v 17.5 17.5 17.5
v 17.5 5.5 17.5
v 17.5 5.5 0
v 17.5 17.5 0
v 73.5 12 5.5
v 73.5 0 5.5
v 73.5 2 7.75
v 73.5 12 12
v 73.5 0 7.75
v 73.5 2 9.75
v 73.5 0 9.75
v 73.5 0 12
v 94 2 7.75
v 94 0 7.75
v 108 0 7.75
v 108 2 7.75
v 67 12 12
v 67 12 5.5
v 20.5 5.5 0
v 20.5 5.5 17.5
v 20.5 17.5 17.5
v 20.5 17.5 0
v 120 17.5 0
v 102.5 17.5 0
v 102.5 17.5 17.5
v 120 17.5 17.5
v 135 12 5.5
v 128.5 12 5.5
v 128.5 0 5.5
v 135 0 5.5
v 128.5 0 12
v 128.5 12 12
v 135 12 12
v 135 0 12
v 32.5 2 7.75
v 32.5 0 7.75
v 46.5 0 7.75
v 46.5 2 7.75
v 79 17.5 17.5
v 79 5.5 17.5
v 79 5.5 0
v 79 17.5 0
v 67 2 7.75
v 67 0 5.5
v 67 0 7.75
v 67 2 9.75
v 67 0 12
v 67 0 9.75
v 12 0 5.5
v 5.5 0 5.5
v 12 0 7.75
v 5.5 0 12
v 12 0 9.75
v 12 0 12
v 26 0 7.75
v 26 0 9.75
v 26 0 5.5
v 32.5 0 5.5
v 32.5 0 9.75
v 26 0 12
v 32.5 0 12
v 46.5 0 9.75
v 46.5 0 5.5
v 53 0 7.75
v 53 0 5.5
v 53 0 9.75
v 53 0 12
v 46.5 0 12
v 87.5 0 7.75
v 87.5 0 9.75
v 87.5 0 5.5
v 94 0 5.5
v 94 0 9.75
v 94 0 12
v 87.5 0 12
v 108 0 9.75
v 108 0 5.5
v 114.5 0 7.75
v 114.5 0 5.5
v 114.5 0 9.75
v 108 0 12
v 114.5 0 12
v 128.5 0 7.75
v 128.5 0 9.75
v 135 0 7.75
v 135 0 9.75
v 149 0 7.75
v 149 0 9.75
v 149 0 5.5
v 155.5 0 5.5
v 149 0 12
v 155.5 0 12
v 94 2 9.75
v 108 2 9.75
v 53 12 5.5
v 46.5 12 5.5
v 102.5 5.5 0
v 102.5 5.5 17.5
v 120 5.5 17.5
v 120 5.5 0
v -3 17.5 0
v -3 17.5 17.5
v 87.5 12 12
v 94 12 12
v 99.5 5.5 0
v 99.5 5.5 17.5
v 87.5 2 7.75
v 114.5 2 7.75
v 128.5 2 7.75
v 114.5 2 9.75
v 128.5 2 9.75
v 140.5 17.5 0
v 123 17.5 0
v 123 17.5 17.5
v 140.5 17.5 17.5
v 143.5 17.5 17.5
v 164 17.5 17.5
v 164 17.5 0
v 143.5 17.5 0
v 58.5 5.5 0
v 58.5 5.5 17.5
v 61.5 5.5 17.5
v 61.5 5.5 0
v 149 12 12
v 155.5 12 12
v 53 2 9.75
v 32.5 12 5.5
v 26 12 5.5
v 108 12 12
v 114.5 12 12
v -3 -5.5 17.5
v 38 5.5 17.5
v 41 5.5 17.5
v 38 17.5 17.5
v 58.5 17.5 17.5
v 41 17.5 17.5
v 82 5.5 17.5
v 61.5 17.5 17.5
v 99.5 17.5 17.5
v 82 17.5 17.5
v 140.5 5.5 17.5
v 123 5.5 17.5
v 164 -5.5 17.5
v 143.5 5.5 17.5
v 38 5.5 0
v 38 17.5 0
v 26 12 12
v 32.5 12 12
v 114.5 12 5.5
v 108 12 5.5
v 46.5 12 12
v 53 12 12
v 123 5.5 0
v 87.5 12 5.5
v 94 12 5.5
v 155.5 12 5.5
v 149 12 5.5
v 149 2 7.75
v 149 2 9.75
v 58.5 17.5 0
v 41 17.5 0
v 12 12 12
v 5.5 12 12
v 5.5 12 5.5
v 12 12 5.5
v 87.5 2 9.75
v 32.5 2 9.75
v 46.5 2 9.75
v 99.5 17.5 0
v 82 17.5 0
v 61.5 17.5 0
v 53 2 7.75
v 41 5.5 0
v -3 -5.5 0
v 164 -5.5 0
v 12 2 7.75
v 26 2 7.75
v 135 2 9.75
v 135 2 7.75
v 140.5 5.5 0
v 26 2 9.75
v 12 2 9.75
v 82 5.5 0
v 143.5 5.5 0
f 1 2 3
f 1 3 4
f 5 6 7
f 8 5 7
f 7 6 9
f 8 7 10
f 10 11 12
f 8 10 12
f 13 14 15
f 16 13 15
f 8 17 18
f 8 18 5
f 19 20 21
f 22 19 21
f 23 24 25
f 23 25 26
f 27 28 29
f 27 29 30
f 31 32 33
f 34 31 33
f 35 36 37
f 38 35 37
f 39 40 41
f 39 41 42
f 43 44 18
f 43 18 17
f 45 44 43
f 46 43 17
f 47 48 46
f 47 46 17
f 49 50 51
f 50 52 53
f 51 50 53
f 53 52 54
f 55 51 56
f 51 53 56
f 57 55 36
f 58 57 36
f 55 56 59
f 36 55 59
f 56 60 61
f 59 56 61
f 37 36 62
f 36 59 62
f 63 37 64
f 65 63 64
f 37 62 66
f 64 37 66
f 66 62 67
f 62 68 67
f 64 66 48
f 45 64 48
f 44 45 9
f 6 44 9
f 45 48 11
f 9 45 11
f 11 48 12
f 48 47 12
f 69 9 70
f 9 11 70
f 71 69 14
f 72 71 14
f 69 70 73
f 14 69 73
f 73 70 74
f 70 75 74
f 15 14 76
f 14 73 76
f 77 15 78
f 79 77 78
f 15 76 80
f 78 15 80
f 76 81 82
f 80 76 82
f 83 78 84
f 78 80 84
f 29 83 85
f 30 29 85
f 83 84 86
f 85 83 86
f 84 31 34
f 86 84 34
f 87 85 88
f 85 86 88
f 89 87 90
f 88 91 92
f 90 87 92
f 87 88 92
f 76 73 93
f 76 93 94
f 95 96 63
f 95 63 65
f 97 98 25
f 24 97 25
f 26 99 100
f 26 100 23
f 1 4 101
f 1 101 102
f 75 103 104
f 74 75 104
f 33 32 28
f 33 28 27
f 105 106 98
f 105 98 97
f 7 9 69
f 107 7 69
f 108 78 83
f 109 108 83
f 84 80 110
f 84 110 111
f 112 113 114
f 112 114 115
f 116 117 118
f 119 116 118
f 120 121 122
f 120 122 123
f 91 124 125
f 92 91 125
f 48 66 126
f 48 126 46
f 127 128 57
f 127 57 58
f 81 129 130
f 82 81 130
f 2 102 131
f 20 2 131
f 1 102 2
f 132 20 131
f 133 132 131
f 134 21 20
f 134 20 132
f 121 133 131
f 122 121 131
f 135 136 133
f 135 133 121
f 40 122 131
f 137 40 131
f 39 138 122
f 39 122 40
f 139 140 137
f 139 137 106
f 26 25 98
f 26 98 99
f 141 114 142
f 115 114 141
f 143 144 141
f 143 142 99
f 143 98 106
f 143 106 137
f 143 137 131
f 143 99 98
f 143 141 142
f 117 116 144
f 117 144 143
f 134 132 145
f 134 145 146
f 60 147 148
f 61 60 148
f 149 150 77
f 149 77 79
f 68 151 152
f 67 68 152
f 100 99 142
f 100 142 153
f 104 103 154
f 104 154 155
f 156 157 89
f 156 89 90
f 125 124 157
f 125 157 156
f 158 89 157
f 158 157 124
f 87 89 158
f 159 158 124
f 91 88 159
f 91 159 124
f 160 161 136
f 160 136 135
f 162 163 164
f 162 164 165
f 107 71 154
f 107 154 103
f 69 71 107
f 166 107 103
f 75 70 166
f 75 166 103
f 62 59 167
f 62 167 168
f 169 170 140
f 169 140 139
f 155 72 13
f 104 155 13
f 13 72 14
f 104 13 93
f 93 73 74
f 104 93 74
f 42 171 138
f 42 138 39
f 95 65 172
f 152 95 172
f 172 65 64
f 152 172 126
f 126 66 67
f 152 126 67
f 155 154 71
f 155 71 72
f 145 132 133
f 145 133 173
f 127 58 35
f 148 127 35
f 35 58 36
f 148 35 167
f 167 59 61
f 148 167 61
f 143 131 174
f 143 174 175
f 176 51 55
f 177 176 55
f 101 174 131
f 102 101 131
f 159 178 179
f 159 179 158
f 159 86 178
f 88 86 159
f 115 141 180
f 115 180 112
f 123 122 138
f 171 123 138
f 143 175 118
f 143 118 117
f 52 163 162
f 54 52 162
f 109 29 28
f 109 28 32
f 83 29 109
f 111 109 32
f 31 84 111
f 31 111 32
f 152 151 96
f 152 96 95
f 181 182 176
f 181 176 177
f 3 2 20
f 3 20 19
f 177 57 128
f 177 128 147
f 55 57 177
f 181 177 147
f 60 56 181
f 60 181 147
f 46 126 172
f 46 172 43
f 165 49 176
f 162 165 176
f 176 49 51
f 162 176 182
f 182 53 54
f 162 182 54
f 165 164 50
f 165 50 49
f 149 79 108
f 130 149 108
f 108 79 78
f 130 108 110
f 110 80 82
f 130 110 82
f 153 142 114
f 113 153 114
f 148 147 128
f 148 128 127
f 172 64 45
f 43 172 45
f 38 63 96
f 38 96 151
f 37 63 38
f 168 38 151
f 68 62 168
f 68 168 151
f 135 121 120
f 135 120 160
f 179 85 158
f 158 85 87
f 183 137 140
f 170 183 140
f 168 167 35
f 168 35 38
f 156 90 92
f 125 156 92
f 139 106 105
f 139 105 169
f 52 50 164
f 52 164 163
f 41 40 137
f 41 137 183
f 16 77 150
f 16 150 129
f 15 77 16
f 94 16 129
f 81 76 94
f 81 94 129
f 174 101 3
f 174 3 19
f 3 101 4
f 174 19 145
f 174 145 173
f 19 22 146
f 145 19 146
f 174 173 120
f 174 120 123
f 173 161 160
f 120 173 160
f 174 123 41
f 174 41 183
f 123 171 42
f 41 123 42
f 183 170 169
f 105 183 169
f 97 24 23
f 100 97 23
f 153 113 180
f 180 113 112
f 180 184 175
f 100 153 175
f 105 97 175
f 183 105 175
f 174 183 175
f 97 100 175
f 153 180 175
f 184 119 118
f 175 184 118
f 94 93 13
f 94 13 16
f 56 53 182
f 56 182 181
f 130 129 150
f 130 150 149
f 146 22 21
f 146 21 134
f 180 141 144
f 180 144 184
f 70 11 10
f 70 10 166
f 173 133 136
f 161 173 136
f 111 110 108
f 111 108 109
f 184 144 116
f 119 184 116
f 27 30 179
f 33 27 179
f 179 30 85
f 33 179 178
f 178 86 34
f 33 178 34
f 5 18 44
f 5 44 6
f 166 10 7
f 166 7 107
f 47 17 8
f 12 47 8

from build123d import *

# Parameters (mm, degrees)
SKETCH1_W           = 17.5
SKETCH1_H           = 17.5
BOSS_EXTRUDE1_DEPTH = 17.5
SKETCH2_W           = 6.5
SKETCH2_H           = 6.5
CUT_EXTRUDE1_DEPTH  = 12
SKETCH3_W           = 17.5
SKETCH3_H           = 5.5
BOSS_EXTRUDE2_DEPTH = 3
LPATTERN1_COUNT     = 8
LPATTERN1_PITCH     = 20.5
SKETCH4_W           = 17.5
SKETCH4_H           = 12
BOSS_EXTRUDE3_DEPTH = 3
SKETCH5_W           = 17.5
SKETCH5_H           = 17.5
BOSS_EXTRUDE4_DEPTH = 3
SKETCH6_W           = 137
SKETCH6_H           = 2
CUT_EXTRUDE2_DEPTH  = 2
SKETCH7_W           = 167
SKETCH7_H           = 17.5
BOSS_EXTRUDE5_DEPTH = 5.5


with BuildPart() as part:
    # Sketch1 → Boss-Extrude1 (new body)
    with BuildSketch(Plane.XY):
        with Locations((8.75, 8.75)):
            Rectangle(SKETCH1_W, SKETCH1_H)
    extrude(amount=BOSS_EXTRUDE1_DEPTH)

    # Sketch2 → Cut-Extrude1 (cut)
    with BuildSketch(Plane.XZ):
        with Locations((8.75, 8.75)):
            Rectangle(SKETCH2_W, SKETCH2_H)
    extrude(amount=-CUT_EXTRUDE1_DEPTH, mode=Mode.SUBTRACT)

    # Sketch3 → Boss-Extrude2 (add)
    with BuildSketch(Plane(origin=(17.5, 0, 0), x_dir=(0, 0, -1), z_dir=(1, 0, 0))):
        with Locations((-8.75, 2.75)):
            Rectangle(SKETCH3_W, SKETCH3_H)
    extrude(amount=BOSS_EXTRUDE2_DEPTH)


with BuildPart() as lpattern1_1:
    # LPattern1: pattern copy
    add(part.part.moved(Location(Vector(1, 0, 0) * (1 * LPATTERN1_PITCH))))


with BuildPart() as lpattern1_2:
    # LPattern1: pattern copy
    add(part.part.moved(Location(Vector(1, 0, 0) * (2 * LPATTERN1_PITCH))))


with BuildPart() as lpattern1_3:
    # LPattern1: pattern copy
    add(part.part.moved(Location(Vector(1, 0, 0) * (3 * LPATTERN1_PITCH))))


with BuildPart() as lpattern1_4:
    # LPattern1: pattern copy
    add(part.part.moved(Location(Vector(1, 0, 0) * (4 * LPATTERN1_PITCH))))


with BuildPart() as lpattern1_5:
    # LPattern1: pattern copy
    add(part.part.moved(Location(Vector(1, 0, 0) * (5 * LPATTERN1_PITCH))))


with BuildPart() as lpattern1_6:
    # LPattern1: pattern copy
    add(part.part.moved(Location(Vector(1, 0, 0) * (6 * LPATTERN1_PITCH))))


with BuildPart() as lpattern1_7:
    # LPattern1: pattern copy
    add(part.part.moved(Location(Vector(1, 0, 0) * (7 * LPATTERN1_PITCH))))


with BuildPart() as lpattern1_1_1:
    add(lpattern1_1.part)

    # Combine1: union LPattern1_2, LPattern1_3, LPattern1_4, LPattern1_5, part, LPattern1_6, LPattern1_7
    add(lpattern1_2.part)
    add(lpattern1_3.part)
    add(lpattern1_4.part)
    add(lpattern1_5.part)
    add(part.part)
    add(lpattern1_6.part)
    add(lpattern1_7.part)

    # Sketch4 → Boss-Extrude3 (add)
    with BuildSketch(Plane(origin=(161, 0, 0), x_dir=(0, 0, -1), z_dir=(1, 0, 0))):
        with Locations((-8.75, 11.5)):
            Rectangle(SKETCH4_W, SKETCH4_H)
    extrude(amount=BOSS_EXTRUDE3_DEPTH)

    # Sketch5 → Boss-Extrude4 (add)
    with BuildSketch(Plane.ZY):
        with Locations((8.75, 8.75)):
            Rectangle(SKETCH5_W, SKETCH5_H)
    extrude(amount=BOSS_EXTRUDE4_DEPTH)

    # Sketch6 → Cut-Extrude2 (cut)
    with BuildSketch(Plane.XZ):
        with Locations((80.5, 8.75)):
            Rectangle(SKETCH6_W, SKETCH6_H)
    extrude(amount=-CUT_EXTRUDE2_DEPTH, mode=Mode.SUBTRACT)

    # Sketch7 → Boss-Extrude5 (add)
    with BuildSketch(Plane.XZ):
        with Locations((80.5, 8.75)):
            Rectangle(SKETCH7_W, SKETCH7_H)
    extrude(amount=BOSS_EXTRUDE5_DEPTH)


solid = lpattern1_1_1.part
